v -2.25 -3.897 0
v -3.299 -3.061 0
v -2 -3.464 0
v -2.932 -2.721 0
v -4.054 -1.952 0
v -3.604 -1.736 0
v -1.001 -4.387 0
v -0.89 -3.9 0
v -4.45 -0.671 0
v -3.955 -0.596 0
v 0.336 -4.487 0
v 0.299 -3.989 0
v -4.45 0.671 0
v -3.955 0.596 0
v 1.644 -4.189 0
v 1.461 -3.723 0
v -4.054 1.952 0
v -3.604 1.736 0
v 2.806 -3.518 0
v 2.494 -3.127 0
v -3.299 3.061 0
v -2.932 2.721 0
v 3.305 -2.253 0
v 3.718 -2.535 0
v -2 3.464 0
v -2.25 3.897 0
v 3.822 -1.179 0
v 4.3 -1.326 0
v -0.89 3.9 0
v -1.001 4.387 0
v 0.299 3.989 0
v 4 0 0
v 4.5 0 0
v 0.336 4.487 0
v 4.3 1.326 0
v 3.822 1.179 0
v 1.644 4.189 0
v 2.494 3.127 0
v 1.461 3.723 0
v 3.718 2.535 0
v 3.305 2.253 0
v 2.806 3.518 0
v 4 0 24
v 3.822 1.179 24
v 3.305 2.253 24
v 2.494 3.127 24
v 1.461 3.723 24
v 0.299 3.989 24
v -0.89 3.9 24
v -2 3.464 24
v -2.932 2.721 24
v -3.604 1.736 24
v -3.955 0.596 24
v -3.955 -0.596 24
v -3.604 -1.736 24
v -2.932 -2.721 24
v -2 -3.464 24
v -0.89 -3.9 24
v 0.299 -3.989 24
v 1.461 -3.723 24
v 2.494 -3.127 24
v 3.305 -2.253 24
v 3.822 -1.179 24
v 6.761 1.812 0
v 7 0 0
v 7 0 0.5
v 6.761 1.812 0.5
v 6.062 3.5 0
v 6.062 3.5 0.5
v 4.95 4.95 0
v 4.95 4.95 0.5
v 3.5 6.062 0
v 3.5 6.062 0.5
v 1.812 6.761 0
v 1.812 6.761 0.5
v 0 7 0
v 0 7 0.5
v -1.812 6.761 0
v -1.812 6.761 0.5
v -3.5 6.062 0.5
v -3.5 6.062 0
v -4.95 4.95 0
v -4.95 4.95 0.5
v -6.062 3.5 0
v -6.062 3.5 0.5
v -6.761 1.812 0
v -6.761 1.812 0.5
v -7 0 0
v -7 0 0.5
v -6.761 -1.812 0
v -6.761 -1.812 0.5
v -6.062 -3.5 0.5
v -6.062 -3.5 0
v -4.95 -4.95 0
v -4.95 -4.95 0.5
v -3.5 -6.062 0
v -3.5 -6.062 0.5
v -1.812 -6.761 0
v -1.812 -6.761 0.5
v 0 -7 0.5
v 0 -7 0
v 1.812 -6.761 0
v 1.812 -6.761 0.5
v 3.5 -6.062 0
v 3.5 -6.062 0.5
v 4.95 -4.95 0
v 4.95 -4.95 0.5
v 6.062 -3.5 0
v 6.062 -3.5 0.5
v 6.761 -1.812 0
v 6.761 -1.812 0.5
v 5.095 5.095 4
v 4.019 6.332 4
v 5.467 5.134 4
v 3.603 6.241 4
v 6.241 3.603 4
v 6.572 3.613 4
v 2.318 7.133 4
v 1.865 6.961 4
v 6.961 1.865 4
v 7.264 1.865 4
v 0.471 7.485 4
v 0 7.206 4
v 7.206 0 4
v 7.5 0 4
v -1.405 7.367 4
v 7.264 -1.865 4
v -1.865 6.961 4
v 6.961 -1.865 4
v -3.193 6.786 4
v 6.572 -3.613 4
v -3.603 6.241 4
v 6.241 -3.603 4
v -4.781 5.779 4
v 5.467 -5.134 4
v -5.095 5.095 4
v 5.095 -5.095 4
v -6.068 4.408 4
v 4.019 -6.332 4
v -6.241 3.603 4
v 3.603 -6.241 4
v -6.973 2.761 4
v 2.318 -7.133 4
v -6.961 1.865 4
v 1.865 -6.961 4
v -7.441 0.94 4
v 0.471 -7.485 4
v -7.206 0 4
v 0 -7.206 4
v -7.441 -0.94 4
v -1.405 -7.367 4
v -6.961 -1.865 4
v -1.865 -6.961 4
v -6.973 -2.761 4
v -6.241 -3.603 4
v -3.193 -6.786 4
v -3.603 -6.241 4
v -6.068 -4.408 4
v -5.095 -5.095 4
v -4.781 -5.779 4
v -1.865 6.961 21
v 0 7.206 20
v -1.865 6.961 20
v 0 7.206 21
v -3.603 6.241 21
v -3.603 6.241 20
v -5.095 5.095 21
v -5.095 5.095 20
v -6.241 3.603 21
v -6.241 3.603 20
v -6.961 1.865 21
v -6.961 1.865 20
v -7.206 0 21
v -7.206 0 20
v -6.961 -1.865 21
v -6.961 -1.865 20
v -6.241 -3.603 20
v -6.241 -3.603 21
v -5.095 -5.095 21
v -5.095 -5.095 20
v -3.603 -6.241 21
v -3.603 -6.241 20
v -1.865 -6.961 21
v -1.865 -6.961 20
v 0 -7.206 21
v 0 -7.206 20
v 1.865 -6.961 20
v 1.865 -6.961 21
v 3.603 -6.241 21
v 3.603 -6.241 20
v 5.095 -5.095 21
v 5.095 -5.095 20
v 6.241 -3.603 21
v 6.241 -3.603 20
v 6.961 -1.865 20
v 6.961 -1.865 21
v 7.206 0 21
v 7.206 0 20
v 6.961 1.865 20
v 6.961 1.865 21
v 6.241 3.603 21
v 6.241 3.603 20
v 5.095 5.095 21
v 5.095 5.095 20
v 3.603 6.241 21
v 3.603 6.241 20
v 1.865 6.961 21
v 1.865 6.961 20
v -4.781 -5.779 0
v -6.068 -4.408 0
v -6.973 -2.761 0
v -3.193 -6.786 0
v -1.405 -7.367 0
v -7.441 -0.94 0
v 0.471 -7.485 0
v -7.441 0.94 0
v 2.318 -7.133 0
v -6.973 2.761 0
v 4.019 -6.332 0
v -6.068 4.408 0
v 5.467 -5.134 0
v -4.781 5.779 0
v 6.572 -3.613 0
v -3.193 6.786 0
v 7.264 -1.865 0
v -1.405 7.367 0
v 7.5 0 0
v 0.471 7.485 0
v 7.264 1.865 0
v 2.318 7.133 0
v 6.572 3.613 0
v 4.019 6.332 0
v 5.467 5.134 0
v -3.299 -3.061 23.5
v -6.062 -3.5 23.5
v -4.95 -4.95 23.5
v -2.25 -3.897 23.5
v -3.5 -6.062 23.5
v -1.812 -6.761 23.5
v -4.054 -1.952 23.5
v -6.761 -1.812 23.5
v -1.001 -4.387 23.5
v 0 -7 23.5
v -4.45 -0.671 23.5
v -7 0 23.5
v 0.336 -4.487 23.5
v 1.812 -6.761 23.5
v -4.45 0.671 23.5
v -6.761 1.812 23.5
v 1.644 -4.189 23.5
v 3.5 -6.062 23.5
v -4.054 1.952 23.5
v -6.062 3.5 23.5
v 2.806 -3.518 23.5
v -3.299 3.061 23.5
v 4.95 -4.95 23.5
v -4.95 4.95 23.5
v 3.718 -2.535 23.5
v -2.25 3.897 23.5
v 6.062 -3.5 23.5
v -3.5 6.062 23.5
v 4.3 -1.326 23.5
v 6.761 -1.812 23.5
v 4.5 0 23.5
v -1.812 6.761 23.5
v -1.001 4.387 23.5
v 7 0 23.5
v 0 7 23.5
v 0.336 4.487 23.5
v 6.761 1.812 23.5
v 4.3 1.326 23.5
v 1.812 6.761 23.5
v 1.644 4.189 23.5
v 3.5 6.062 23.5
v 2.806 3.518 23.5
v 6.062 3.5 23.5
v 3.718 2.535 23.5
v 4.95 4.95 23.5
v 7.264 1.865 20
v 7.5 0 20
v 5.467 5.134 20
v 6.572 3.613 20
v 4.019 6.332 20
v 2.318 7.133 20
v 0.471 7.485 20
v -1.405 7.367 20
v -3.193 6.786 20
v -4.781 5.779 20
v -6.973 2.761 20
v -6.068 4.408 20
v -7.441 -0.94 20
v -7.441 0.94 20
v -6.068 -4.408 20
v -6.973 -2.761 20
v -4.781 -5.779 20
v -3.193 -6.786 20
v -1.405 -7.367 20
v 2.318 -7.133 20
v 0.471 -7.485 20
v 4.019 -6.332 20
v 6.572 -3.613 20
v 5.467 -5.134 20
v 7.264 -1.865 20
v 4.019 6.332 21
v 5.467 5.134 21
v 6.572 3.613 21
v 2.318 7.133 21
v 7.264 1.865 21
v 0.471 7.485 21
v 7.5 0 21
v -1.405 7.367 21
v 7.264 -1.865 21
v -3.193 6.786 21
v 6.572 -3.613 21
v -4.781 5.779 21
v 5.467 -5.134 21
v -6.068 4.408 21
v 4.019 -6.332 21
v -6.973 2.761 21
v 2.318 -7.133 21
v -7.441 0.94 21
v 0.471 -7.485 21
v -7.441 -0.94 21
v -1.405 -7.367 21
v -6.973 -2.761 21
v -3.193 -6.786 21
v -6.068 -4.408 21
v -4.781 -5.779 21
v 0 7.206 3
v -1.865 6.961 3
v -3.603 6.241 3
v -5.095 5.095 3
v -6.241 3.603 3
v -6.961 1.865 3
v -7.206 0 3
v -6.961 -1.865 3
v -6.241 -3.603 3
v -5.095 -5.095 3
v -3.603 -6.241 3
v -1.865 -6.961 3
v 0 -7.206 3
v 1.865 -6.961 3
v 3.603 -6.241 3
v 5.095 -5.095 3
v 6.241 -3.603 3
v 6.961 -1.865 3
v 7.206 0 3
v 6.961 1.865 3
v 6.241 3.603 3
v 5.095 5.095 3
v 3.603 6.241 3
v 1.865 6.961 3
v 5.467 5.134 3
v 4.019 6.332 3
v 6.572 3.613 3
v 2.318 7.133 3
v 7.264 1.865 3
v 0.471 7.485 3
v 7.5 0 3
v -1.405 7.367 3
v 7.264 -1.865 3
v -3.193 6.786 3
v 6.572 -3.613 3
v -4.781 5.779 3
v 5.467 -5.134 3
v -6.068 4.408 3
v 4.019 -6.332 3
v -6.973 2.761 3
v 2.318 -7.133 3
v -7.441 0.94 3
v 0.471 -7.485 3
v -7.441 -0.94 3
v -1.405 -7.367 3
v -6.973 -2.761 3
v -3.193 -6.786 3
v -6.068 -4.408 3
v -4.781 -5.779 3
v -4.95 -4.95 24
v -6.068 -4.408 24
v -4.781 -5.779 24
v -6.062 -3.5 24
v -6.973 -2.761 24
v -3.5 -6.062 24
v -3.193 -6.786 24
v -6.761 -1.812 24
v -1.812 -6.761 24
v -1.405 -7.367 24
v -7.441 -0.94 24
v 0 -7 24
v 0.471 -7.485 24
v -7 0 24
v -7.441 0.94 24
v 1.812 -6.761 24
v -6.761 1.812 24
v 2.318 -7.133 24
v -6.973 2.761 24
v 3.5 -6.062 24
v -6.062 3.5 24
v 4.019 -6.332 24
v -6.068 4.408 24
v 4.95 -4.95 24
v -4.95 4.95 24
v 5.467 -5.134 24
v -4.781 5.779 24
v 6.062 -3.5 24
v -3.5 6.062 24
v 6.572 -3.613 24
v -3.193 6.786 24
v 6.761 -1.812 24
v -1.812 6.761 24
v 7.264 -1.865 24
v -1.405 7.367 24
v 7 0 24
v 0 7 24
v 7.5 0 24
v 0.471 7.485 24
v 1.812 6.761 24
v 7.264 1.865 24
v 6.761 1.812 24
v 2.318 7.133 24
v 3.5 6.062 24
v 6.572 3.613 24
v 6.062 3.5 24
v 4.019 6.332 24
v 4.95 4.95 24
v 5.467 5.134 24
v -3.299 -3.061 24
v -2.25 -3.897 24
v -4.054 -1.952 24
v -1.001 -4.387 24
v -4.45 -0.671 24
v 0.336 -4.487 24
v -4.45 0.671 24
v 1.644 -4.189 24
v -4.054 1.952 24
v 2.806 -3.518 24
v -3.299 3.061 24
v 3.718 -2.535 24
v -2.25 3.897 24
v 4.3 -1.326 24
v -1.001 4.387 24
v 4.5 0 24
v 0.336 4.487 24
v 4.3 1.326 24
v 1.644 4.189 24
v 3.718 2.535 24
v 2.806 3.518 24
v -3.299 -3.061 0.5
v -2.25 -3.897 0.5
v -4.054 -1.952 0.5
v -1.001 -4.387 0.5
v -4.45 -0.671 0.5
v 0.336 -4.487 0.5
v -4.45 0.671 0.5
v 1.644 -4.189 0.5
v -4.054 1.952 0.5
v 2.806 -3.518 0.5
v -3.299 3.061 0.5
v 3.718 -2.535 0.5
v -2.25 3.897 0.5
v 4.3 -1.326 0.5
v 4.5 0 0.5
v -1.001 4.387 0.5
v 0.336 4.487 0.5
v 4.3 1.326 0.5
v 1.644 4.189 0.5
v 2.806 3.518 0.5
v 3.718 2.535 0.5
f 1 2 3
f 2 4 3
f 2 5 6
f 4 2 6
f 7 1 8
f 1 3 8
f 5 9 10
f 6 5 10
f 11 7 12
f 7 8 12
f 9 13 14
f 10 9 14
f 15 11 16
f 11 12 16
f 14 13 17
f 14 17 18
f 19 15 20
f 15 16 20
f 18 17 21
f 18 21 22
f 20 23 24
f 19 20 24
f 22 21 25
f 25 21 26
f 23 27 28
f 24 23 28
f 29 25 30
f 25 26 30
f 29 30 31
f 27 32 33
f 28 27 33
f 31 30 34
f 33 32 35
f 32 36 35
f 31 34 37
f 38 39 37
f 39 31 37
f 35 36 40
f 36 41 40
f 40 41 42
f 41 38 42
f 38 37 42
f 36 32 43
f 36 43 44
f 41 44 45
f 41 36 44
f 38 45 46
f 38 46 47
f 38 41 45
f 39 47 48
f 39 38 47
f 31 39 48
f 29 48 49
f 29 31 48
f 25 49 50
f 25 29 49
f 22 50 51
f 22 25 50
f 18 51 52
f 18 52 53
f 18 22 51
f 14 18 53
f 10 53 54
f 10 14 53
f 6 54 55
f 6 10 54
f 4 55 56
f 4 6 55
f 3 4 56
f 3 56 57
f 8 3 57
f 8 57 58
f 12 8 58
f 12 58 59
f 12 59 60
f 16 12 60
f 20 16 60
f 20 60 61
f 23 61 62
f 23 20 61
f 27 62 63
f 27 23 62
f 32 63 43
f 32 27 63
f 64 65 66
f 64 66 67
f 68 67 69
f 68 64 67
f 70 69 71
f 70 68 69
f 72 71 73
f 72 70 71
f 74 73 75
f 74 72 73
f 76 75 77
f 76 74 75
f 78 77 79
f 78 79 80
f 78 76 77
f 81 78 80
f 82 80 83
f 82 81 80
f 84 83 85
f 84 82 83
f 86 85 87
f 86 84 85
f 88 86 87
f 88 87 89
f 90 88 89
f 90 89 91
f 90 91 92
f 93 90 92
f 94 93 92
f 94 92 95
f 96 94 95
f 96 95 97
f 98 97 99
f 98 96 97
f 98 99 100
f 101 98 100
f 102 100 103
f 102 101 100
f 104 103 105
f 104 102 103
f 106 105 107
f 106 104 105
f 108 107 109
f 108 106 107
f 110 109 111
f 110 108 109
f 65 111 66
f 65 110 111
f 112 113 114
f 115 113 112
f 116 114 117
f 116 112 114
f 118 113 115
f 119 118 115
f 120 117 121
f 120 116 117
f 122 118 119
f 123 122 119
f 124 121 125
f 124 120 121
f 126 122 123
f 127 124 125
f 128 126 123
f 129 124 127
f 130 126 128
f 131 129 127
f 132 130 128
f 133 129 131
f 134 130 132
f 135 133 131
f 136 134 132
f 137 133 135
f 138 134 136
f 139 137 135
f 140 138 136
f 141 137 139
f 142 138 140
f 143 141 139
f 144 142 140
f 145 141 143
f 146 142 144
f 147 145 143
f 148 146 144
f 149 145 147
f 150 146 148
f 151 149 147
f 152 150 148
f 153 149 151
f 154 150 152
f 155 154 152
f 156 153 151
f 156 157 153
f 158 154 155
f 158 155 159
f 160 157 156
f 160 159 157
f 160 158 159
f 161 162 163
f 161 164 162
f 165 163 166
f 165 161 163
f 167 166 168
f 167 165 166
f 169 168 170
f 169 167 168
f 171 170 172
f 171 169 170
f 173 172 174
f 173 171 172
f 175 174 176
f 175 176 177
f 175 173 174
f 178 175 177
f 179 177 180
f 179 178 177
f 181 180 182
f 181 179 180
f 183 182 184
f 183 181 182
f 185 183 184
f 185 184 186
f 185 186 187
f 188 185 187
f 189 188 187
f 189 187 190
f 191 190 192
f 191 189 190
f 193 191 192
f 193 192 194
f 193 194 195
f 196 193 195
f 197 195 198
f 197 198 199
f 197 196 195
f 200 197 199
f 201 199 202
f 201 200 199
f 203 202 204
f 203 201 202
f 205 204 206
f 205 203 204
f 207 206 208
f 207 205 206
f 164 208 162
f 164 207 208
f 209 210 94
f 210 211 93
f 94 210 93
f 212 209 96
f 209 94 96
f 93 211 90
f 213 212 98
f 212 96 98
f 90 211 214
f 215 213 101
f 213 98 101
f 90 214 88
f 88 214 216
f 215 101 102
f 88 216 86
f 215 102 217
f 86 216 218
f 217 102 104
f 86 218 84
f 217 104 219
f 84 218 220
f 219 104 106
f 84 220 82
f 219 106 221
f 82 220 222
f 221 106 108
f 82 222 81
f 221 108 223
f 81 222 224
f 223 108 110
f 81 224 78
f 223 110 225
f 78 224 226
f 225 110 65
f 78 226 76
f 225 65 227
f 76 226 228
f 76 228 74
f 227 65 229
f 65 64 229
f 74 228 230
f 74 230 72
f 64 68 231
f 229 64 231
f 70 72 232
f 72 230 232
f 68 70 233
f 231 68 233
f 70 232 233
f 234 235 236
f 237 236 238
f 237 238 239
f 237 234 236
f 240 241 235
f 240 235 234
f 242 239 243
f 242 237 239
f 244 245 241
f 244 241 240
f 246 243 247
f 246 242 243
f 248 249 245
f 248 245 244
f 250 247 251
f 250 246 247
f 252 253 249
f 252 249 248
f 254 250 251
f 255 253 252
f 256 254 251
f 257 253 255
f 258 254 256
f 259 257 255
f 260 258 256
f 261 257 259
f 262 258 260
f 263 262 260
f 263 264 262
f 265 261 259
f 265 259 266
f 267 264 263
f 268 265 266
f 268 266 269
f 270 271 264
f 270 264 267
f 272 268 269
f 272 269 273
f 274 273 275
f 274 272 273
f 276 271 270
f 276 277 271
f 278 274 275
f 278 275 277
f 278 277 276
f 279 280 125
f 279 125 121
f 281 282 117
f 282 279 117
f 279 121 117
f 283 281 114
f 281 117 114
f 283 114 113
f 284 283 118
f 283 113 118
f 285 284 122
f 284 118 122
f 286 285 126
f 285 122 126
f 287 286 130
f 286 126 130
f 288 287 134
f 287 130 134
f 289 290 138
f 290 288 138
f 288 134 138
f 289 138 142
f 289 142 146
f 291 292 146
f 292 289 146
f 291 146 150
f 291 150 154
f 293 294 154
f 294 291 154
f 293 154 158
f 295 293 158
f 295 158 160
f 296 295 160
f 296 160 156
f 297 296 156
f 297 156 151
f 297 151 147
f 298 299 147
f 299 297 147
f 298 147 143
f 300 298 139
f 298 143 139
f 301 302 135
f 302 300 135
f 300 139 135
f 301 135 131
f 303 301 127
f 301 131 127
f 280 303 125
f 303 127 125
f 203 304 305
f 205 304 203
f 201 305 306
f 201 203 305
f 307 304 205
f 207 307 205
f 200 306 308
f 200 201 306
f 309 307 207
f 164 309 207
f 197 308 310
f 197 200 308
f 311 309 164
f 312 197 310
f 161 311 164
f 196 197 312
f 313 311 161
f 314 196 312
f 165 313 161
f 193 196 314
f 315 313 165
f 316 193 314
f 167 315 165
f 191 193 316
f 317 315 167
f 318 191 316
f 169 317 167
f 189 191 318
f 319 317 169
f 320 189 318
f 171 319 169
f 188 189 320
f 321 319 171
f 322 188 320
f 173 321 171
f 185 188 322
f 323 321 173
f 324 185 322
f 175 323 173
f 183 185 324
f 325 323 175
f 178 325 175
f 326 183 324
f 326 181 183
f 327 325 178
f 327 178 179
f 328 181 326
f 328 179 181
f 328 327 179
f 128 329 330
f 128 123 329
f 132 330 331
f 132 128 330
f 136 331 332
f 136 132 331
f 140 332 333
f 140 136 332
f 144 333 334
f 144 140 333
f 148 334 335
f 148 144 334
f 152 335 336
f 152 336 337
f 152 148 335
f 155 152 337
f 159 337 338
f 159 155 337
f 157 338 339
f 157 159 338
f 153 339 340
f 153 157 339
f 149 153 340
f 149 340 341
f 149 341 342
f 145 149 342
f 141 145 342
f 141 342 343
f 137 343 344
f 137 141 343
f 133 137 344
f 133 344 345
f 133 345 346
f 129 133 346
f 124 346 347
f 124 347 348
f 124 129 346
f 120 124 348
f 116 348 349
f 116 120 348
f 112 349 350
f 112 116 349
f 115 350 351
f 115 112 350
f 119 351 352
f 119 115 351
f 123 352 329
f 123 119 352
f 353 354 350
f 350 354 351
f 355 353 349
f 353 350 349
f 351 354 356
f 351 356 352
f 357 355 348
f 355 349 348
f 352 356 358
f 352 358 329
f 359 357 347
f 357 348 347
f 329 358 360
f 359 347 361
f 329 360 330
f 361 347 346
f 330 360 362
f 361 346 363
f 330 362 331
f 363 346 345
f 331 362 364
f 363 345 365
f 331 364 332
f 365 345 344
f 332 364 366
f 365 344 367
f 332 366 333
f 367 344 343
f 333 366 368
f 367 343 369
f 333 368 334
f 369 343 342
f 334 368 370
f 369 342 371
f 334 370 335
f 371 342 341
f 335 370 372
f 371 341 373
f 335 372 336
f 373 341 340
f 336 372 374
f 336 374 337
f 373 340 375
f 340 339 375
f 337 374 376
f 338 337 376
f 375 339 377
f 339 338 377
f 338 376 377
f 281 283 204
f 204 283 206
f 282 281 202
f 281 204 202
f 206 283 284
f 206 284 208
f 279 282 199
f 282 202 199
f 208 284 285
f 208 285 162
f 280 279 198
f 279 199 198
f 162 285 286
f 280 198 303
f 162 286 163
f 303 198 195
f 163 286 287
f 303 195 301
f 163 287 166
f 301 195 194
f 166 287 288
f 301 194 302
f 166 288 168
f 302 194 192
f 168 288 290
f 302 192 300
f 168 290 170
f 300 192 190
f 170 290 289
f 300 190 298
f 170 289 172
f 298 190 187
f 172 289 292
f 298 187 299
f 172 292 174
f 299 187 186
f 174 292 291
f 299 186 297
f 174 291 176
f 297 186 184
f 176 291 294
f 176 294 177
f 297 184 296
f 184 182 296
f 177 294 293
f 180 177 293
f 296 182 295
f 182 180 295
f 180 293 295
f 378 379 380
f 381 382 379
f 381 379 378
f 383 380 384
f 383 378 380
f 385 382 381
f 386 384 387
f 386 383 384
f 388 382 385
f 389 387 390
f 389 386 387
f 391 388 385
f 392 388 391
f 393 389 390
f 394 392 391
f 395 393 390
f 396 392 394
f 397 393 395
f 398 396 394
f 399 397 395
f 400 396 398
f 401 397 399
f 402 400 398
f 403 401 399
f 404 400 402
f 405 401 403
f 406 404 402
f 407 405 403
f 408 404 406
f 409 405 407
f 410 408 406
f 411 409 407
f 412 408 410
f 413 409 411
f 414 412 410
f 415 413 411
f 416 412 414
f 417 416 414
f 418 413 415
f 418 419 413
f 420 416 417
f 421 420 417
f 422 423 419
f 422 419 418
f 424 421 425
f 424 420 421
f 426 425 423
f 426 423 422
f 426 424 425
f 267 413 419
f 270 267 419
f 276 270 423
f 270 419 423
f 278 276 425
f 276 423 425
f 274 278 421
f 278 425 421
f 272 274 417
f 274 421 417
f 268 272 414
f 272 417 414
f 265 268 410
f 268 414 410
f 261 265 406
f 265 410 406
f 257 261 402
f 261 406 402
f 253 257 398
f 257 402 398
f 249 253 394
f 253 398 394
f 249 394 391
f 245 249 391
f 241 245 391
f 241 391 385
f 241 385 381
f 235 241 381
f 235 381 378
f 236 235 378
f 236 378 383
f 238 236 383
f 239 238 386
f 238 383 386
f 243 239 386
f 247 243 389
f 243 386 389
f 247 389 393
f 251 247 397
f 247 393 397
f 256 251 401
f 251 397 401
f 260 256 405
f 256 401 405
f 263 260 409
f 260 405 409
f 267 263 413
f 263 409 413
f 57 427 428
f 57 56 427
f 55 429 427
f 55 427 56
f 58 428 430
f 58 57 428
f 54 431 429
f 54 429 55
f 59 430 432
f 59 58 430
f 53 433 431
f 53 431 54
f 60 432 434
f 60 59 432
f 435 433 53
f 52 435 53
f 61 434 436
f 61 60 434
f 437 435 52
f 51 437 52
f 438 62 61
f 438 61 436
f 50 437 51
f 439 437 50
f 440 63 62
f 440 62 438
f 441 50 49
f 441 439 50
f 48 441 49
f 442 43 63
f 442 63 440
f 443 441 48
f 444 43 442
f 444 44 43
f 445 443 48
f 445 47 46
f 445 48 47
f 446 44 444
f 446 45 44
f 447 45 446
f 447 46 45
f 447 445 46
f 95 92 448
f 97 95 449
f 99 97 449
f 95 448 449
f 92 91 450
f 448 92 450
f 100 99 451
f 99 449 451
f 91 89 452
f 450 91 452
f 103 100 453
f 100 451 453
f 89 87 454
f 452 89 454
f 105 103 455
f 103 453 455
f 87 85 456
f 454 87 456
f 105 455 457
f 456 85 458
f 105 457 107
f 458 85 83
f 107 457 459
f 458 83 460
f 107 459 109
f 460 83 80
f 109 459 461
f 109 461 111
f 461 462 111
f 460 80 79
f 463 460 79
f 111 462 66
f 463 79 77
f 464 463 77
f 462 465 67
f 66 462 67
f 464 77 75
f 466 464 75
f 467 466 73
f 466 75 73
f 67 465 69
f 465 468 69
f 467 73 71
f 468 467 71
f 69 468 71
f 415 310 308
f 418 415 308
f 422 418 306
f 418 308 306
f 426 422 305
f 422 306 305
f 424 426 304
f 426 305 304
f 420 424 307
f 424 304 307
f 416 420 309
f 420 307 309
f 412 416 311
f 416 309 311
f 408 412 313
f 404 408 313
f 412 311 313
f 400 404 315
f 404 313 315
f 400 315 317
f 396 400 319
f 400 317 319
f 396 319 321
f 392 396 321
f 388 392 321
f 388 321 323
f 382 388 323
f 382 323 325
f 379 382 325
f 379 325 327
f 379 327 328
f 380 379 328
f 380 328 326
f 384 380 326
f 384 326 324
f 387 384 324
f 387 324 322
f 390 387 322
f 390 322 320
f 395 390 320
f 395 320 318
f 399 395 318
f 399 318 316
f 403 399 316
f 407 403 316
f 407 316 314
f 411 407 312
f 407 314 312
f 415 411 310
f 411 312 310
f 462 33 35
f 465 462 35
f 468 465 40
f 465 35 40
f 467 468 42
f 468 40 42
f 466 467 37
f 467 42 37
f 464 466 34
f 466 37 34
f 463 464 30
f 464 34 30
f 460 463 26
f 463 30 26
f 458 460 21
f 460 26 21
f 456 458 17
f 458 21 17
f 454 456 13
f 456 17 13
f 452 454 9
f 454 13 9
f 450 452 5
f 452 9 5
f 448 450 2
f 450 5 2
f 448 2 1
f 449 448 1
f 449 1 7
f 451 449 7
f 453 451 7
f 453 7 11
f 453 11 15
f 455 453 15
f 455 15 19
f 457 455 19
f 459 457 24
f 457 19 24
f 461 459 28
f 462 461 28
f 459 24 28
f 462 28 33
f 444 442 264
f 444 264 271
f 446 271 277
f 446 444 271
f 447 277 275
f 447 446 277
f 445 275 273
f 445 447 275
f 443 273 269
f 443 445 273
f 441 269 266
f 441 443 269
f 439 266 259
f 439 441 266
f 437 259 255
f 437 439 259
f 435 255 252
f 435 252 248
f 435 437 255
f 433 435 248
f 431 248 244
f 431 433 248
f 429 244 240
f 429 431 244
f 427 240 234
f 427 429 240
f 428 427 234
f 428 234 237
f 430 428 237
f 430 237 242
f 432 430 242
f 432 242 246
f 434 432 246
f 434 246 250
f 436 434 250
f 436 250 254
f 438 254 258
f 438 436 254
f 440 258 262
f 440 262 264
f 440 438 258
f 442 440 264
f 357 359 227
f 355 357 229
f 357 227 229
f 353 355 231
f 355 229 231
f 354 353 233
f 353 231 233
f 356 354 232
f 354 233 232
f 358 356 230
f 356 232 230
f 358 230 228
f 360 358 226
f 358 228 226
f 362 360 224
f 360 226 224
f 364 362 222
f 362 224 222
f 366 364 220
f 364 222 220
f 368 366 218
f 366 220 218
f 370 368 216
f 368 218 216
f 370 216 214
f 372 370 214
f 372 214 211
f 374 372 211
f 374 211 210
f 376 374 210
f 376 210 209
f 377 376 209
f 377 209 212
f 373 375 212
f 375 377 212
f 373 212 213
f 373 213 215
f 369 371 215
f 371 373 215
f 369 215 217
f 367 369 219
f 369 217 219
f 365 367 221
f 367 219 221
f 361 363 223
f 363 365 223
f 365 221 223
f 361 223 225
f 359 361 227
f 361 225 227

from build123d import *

# Parameters (mm, degrees)
F0_R     = 7.5
F0_R_2   = 4
F1_DEPTH = 24
F2_W     = 2.5912171826
F2_H     = 1
F4_R     = 7
F4_R_2   = 4.5
F5_DEPTH = 0.5


# Not quite as in the source:
# - a pattern or mirror of a feature is missing from the dataset's text; its kind, count and spacing are read off the source's solid


with BuildPart() as f1:
    # F0 (on Top) → F1 (new body)
    with BuildSketch(Plane.XY):
        Circle(F0_R)
        Circle(F0_R_2, mode=Mode.SUBTRACT)
    extrude(amount=F1_DEPTH)

    # F2 (on Right) → F3 (revolve, cut)
    with BuildSketch(Plane.YZ):
        with Locations((8.5017232858, 20.5)):
            Rectangle(F2_W, F2_H)
        with Locations((8.5017232858, 3.5)):
            Rectangle(F2_W, F2_H)
    revolve(axis=Axis((0, 0, 24), (0, 0, 1)), mode=Mode.SUBTRACT)

    # F4 (on face) → F5 (cut)
    with BuildSketch(Plane.XY.offset(24)):
        Circle(F4_R)
        Circle(F4_R_2, mode=Mode.SUBTRACT)
    f5 = extrude(amount=-F5_DEPTH, mode=Mode.SUBTRACT)

    # F5_copies: F5 across plane
    add(f5.mirror(Plane(origin=(0, 0, 12), x_dir=(-1, 0, 0), z_dir=(0, 0, -1))), mode=Mode.SUBTRACT)


solid = f1.part
